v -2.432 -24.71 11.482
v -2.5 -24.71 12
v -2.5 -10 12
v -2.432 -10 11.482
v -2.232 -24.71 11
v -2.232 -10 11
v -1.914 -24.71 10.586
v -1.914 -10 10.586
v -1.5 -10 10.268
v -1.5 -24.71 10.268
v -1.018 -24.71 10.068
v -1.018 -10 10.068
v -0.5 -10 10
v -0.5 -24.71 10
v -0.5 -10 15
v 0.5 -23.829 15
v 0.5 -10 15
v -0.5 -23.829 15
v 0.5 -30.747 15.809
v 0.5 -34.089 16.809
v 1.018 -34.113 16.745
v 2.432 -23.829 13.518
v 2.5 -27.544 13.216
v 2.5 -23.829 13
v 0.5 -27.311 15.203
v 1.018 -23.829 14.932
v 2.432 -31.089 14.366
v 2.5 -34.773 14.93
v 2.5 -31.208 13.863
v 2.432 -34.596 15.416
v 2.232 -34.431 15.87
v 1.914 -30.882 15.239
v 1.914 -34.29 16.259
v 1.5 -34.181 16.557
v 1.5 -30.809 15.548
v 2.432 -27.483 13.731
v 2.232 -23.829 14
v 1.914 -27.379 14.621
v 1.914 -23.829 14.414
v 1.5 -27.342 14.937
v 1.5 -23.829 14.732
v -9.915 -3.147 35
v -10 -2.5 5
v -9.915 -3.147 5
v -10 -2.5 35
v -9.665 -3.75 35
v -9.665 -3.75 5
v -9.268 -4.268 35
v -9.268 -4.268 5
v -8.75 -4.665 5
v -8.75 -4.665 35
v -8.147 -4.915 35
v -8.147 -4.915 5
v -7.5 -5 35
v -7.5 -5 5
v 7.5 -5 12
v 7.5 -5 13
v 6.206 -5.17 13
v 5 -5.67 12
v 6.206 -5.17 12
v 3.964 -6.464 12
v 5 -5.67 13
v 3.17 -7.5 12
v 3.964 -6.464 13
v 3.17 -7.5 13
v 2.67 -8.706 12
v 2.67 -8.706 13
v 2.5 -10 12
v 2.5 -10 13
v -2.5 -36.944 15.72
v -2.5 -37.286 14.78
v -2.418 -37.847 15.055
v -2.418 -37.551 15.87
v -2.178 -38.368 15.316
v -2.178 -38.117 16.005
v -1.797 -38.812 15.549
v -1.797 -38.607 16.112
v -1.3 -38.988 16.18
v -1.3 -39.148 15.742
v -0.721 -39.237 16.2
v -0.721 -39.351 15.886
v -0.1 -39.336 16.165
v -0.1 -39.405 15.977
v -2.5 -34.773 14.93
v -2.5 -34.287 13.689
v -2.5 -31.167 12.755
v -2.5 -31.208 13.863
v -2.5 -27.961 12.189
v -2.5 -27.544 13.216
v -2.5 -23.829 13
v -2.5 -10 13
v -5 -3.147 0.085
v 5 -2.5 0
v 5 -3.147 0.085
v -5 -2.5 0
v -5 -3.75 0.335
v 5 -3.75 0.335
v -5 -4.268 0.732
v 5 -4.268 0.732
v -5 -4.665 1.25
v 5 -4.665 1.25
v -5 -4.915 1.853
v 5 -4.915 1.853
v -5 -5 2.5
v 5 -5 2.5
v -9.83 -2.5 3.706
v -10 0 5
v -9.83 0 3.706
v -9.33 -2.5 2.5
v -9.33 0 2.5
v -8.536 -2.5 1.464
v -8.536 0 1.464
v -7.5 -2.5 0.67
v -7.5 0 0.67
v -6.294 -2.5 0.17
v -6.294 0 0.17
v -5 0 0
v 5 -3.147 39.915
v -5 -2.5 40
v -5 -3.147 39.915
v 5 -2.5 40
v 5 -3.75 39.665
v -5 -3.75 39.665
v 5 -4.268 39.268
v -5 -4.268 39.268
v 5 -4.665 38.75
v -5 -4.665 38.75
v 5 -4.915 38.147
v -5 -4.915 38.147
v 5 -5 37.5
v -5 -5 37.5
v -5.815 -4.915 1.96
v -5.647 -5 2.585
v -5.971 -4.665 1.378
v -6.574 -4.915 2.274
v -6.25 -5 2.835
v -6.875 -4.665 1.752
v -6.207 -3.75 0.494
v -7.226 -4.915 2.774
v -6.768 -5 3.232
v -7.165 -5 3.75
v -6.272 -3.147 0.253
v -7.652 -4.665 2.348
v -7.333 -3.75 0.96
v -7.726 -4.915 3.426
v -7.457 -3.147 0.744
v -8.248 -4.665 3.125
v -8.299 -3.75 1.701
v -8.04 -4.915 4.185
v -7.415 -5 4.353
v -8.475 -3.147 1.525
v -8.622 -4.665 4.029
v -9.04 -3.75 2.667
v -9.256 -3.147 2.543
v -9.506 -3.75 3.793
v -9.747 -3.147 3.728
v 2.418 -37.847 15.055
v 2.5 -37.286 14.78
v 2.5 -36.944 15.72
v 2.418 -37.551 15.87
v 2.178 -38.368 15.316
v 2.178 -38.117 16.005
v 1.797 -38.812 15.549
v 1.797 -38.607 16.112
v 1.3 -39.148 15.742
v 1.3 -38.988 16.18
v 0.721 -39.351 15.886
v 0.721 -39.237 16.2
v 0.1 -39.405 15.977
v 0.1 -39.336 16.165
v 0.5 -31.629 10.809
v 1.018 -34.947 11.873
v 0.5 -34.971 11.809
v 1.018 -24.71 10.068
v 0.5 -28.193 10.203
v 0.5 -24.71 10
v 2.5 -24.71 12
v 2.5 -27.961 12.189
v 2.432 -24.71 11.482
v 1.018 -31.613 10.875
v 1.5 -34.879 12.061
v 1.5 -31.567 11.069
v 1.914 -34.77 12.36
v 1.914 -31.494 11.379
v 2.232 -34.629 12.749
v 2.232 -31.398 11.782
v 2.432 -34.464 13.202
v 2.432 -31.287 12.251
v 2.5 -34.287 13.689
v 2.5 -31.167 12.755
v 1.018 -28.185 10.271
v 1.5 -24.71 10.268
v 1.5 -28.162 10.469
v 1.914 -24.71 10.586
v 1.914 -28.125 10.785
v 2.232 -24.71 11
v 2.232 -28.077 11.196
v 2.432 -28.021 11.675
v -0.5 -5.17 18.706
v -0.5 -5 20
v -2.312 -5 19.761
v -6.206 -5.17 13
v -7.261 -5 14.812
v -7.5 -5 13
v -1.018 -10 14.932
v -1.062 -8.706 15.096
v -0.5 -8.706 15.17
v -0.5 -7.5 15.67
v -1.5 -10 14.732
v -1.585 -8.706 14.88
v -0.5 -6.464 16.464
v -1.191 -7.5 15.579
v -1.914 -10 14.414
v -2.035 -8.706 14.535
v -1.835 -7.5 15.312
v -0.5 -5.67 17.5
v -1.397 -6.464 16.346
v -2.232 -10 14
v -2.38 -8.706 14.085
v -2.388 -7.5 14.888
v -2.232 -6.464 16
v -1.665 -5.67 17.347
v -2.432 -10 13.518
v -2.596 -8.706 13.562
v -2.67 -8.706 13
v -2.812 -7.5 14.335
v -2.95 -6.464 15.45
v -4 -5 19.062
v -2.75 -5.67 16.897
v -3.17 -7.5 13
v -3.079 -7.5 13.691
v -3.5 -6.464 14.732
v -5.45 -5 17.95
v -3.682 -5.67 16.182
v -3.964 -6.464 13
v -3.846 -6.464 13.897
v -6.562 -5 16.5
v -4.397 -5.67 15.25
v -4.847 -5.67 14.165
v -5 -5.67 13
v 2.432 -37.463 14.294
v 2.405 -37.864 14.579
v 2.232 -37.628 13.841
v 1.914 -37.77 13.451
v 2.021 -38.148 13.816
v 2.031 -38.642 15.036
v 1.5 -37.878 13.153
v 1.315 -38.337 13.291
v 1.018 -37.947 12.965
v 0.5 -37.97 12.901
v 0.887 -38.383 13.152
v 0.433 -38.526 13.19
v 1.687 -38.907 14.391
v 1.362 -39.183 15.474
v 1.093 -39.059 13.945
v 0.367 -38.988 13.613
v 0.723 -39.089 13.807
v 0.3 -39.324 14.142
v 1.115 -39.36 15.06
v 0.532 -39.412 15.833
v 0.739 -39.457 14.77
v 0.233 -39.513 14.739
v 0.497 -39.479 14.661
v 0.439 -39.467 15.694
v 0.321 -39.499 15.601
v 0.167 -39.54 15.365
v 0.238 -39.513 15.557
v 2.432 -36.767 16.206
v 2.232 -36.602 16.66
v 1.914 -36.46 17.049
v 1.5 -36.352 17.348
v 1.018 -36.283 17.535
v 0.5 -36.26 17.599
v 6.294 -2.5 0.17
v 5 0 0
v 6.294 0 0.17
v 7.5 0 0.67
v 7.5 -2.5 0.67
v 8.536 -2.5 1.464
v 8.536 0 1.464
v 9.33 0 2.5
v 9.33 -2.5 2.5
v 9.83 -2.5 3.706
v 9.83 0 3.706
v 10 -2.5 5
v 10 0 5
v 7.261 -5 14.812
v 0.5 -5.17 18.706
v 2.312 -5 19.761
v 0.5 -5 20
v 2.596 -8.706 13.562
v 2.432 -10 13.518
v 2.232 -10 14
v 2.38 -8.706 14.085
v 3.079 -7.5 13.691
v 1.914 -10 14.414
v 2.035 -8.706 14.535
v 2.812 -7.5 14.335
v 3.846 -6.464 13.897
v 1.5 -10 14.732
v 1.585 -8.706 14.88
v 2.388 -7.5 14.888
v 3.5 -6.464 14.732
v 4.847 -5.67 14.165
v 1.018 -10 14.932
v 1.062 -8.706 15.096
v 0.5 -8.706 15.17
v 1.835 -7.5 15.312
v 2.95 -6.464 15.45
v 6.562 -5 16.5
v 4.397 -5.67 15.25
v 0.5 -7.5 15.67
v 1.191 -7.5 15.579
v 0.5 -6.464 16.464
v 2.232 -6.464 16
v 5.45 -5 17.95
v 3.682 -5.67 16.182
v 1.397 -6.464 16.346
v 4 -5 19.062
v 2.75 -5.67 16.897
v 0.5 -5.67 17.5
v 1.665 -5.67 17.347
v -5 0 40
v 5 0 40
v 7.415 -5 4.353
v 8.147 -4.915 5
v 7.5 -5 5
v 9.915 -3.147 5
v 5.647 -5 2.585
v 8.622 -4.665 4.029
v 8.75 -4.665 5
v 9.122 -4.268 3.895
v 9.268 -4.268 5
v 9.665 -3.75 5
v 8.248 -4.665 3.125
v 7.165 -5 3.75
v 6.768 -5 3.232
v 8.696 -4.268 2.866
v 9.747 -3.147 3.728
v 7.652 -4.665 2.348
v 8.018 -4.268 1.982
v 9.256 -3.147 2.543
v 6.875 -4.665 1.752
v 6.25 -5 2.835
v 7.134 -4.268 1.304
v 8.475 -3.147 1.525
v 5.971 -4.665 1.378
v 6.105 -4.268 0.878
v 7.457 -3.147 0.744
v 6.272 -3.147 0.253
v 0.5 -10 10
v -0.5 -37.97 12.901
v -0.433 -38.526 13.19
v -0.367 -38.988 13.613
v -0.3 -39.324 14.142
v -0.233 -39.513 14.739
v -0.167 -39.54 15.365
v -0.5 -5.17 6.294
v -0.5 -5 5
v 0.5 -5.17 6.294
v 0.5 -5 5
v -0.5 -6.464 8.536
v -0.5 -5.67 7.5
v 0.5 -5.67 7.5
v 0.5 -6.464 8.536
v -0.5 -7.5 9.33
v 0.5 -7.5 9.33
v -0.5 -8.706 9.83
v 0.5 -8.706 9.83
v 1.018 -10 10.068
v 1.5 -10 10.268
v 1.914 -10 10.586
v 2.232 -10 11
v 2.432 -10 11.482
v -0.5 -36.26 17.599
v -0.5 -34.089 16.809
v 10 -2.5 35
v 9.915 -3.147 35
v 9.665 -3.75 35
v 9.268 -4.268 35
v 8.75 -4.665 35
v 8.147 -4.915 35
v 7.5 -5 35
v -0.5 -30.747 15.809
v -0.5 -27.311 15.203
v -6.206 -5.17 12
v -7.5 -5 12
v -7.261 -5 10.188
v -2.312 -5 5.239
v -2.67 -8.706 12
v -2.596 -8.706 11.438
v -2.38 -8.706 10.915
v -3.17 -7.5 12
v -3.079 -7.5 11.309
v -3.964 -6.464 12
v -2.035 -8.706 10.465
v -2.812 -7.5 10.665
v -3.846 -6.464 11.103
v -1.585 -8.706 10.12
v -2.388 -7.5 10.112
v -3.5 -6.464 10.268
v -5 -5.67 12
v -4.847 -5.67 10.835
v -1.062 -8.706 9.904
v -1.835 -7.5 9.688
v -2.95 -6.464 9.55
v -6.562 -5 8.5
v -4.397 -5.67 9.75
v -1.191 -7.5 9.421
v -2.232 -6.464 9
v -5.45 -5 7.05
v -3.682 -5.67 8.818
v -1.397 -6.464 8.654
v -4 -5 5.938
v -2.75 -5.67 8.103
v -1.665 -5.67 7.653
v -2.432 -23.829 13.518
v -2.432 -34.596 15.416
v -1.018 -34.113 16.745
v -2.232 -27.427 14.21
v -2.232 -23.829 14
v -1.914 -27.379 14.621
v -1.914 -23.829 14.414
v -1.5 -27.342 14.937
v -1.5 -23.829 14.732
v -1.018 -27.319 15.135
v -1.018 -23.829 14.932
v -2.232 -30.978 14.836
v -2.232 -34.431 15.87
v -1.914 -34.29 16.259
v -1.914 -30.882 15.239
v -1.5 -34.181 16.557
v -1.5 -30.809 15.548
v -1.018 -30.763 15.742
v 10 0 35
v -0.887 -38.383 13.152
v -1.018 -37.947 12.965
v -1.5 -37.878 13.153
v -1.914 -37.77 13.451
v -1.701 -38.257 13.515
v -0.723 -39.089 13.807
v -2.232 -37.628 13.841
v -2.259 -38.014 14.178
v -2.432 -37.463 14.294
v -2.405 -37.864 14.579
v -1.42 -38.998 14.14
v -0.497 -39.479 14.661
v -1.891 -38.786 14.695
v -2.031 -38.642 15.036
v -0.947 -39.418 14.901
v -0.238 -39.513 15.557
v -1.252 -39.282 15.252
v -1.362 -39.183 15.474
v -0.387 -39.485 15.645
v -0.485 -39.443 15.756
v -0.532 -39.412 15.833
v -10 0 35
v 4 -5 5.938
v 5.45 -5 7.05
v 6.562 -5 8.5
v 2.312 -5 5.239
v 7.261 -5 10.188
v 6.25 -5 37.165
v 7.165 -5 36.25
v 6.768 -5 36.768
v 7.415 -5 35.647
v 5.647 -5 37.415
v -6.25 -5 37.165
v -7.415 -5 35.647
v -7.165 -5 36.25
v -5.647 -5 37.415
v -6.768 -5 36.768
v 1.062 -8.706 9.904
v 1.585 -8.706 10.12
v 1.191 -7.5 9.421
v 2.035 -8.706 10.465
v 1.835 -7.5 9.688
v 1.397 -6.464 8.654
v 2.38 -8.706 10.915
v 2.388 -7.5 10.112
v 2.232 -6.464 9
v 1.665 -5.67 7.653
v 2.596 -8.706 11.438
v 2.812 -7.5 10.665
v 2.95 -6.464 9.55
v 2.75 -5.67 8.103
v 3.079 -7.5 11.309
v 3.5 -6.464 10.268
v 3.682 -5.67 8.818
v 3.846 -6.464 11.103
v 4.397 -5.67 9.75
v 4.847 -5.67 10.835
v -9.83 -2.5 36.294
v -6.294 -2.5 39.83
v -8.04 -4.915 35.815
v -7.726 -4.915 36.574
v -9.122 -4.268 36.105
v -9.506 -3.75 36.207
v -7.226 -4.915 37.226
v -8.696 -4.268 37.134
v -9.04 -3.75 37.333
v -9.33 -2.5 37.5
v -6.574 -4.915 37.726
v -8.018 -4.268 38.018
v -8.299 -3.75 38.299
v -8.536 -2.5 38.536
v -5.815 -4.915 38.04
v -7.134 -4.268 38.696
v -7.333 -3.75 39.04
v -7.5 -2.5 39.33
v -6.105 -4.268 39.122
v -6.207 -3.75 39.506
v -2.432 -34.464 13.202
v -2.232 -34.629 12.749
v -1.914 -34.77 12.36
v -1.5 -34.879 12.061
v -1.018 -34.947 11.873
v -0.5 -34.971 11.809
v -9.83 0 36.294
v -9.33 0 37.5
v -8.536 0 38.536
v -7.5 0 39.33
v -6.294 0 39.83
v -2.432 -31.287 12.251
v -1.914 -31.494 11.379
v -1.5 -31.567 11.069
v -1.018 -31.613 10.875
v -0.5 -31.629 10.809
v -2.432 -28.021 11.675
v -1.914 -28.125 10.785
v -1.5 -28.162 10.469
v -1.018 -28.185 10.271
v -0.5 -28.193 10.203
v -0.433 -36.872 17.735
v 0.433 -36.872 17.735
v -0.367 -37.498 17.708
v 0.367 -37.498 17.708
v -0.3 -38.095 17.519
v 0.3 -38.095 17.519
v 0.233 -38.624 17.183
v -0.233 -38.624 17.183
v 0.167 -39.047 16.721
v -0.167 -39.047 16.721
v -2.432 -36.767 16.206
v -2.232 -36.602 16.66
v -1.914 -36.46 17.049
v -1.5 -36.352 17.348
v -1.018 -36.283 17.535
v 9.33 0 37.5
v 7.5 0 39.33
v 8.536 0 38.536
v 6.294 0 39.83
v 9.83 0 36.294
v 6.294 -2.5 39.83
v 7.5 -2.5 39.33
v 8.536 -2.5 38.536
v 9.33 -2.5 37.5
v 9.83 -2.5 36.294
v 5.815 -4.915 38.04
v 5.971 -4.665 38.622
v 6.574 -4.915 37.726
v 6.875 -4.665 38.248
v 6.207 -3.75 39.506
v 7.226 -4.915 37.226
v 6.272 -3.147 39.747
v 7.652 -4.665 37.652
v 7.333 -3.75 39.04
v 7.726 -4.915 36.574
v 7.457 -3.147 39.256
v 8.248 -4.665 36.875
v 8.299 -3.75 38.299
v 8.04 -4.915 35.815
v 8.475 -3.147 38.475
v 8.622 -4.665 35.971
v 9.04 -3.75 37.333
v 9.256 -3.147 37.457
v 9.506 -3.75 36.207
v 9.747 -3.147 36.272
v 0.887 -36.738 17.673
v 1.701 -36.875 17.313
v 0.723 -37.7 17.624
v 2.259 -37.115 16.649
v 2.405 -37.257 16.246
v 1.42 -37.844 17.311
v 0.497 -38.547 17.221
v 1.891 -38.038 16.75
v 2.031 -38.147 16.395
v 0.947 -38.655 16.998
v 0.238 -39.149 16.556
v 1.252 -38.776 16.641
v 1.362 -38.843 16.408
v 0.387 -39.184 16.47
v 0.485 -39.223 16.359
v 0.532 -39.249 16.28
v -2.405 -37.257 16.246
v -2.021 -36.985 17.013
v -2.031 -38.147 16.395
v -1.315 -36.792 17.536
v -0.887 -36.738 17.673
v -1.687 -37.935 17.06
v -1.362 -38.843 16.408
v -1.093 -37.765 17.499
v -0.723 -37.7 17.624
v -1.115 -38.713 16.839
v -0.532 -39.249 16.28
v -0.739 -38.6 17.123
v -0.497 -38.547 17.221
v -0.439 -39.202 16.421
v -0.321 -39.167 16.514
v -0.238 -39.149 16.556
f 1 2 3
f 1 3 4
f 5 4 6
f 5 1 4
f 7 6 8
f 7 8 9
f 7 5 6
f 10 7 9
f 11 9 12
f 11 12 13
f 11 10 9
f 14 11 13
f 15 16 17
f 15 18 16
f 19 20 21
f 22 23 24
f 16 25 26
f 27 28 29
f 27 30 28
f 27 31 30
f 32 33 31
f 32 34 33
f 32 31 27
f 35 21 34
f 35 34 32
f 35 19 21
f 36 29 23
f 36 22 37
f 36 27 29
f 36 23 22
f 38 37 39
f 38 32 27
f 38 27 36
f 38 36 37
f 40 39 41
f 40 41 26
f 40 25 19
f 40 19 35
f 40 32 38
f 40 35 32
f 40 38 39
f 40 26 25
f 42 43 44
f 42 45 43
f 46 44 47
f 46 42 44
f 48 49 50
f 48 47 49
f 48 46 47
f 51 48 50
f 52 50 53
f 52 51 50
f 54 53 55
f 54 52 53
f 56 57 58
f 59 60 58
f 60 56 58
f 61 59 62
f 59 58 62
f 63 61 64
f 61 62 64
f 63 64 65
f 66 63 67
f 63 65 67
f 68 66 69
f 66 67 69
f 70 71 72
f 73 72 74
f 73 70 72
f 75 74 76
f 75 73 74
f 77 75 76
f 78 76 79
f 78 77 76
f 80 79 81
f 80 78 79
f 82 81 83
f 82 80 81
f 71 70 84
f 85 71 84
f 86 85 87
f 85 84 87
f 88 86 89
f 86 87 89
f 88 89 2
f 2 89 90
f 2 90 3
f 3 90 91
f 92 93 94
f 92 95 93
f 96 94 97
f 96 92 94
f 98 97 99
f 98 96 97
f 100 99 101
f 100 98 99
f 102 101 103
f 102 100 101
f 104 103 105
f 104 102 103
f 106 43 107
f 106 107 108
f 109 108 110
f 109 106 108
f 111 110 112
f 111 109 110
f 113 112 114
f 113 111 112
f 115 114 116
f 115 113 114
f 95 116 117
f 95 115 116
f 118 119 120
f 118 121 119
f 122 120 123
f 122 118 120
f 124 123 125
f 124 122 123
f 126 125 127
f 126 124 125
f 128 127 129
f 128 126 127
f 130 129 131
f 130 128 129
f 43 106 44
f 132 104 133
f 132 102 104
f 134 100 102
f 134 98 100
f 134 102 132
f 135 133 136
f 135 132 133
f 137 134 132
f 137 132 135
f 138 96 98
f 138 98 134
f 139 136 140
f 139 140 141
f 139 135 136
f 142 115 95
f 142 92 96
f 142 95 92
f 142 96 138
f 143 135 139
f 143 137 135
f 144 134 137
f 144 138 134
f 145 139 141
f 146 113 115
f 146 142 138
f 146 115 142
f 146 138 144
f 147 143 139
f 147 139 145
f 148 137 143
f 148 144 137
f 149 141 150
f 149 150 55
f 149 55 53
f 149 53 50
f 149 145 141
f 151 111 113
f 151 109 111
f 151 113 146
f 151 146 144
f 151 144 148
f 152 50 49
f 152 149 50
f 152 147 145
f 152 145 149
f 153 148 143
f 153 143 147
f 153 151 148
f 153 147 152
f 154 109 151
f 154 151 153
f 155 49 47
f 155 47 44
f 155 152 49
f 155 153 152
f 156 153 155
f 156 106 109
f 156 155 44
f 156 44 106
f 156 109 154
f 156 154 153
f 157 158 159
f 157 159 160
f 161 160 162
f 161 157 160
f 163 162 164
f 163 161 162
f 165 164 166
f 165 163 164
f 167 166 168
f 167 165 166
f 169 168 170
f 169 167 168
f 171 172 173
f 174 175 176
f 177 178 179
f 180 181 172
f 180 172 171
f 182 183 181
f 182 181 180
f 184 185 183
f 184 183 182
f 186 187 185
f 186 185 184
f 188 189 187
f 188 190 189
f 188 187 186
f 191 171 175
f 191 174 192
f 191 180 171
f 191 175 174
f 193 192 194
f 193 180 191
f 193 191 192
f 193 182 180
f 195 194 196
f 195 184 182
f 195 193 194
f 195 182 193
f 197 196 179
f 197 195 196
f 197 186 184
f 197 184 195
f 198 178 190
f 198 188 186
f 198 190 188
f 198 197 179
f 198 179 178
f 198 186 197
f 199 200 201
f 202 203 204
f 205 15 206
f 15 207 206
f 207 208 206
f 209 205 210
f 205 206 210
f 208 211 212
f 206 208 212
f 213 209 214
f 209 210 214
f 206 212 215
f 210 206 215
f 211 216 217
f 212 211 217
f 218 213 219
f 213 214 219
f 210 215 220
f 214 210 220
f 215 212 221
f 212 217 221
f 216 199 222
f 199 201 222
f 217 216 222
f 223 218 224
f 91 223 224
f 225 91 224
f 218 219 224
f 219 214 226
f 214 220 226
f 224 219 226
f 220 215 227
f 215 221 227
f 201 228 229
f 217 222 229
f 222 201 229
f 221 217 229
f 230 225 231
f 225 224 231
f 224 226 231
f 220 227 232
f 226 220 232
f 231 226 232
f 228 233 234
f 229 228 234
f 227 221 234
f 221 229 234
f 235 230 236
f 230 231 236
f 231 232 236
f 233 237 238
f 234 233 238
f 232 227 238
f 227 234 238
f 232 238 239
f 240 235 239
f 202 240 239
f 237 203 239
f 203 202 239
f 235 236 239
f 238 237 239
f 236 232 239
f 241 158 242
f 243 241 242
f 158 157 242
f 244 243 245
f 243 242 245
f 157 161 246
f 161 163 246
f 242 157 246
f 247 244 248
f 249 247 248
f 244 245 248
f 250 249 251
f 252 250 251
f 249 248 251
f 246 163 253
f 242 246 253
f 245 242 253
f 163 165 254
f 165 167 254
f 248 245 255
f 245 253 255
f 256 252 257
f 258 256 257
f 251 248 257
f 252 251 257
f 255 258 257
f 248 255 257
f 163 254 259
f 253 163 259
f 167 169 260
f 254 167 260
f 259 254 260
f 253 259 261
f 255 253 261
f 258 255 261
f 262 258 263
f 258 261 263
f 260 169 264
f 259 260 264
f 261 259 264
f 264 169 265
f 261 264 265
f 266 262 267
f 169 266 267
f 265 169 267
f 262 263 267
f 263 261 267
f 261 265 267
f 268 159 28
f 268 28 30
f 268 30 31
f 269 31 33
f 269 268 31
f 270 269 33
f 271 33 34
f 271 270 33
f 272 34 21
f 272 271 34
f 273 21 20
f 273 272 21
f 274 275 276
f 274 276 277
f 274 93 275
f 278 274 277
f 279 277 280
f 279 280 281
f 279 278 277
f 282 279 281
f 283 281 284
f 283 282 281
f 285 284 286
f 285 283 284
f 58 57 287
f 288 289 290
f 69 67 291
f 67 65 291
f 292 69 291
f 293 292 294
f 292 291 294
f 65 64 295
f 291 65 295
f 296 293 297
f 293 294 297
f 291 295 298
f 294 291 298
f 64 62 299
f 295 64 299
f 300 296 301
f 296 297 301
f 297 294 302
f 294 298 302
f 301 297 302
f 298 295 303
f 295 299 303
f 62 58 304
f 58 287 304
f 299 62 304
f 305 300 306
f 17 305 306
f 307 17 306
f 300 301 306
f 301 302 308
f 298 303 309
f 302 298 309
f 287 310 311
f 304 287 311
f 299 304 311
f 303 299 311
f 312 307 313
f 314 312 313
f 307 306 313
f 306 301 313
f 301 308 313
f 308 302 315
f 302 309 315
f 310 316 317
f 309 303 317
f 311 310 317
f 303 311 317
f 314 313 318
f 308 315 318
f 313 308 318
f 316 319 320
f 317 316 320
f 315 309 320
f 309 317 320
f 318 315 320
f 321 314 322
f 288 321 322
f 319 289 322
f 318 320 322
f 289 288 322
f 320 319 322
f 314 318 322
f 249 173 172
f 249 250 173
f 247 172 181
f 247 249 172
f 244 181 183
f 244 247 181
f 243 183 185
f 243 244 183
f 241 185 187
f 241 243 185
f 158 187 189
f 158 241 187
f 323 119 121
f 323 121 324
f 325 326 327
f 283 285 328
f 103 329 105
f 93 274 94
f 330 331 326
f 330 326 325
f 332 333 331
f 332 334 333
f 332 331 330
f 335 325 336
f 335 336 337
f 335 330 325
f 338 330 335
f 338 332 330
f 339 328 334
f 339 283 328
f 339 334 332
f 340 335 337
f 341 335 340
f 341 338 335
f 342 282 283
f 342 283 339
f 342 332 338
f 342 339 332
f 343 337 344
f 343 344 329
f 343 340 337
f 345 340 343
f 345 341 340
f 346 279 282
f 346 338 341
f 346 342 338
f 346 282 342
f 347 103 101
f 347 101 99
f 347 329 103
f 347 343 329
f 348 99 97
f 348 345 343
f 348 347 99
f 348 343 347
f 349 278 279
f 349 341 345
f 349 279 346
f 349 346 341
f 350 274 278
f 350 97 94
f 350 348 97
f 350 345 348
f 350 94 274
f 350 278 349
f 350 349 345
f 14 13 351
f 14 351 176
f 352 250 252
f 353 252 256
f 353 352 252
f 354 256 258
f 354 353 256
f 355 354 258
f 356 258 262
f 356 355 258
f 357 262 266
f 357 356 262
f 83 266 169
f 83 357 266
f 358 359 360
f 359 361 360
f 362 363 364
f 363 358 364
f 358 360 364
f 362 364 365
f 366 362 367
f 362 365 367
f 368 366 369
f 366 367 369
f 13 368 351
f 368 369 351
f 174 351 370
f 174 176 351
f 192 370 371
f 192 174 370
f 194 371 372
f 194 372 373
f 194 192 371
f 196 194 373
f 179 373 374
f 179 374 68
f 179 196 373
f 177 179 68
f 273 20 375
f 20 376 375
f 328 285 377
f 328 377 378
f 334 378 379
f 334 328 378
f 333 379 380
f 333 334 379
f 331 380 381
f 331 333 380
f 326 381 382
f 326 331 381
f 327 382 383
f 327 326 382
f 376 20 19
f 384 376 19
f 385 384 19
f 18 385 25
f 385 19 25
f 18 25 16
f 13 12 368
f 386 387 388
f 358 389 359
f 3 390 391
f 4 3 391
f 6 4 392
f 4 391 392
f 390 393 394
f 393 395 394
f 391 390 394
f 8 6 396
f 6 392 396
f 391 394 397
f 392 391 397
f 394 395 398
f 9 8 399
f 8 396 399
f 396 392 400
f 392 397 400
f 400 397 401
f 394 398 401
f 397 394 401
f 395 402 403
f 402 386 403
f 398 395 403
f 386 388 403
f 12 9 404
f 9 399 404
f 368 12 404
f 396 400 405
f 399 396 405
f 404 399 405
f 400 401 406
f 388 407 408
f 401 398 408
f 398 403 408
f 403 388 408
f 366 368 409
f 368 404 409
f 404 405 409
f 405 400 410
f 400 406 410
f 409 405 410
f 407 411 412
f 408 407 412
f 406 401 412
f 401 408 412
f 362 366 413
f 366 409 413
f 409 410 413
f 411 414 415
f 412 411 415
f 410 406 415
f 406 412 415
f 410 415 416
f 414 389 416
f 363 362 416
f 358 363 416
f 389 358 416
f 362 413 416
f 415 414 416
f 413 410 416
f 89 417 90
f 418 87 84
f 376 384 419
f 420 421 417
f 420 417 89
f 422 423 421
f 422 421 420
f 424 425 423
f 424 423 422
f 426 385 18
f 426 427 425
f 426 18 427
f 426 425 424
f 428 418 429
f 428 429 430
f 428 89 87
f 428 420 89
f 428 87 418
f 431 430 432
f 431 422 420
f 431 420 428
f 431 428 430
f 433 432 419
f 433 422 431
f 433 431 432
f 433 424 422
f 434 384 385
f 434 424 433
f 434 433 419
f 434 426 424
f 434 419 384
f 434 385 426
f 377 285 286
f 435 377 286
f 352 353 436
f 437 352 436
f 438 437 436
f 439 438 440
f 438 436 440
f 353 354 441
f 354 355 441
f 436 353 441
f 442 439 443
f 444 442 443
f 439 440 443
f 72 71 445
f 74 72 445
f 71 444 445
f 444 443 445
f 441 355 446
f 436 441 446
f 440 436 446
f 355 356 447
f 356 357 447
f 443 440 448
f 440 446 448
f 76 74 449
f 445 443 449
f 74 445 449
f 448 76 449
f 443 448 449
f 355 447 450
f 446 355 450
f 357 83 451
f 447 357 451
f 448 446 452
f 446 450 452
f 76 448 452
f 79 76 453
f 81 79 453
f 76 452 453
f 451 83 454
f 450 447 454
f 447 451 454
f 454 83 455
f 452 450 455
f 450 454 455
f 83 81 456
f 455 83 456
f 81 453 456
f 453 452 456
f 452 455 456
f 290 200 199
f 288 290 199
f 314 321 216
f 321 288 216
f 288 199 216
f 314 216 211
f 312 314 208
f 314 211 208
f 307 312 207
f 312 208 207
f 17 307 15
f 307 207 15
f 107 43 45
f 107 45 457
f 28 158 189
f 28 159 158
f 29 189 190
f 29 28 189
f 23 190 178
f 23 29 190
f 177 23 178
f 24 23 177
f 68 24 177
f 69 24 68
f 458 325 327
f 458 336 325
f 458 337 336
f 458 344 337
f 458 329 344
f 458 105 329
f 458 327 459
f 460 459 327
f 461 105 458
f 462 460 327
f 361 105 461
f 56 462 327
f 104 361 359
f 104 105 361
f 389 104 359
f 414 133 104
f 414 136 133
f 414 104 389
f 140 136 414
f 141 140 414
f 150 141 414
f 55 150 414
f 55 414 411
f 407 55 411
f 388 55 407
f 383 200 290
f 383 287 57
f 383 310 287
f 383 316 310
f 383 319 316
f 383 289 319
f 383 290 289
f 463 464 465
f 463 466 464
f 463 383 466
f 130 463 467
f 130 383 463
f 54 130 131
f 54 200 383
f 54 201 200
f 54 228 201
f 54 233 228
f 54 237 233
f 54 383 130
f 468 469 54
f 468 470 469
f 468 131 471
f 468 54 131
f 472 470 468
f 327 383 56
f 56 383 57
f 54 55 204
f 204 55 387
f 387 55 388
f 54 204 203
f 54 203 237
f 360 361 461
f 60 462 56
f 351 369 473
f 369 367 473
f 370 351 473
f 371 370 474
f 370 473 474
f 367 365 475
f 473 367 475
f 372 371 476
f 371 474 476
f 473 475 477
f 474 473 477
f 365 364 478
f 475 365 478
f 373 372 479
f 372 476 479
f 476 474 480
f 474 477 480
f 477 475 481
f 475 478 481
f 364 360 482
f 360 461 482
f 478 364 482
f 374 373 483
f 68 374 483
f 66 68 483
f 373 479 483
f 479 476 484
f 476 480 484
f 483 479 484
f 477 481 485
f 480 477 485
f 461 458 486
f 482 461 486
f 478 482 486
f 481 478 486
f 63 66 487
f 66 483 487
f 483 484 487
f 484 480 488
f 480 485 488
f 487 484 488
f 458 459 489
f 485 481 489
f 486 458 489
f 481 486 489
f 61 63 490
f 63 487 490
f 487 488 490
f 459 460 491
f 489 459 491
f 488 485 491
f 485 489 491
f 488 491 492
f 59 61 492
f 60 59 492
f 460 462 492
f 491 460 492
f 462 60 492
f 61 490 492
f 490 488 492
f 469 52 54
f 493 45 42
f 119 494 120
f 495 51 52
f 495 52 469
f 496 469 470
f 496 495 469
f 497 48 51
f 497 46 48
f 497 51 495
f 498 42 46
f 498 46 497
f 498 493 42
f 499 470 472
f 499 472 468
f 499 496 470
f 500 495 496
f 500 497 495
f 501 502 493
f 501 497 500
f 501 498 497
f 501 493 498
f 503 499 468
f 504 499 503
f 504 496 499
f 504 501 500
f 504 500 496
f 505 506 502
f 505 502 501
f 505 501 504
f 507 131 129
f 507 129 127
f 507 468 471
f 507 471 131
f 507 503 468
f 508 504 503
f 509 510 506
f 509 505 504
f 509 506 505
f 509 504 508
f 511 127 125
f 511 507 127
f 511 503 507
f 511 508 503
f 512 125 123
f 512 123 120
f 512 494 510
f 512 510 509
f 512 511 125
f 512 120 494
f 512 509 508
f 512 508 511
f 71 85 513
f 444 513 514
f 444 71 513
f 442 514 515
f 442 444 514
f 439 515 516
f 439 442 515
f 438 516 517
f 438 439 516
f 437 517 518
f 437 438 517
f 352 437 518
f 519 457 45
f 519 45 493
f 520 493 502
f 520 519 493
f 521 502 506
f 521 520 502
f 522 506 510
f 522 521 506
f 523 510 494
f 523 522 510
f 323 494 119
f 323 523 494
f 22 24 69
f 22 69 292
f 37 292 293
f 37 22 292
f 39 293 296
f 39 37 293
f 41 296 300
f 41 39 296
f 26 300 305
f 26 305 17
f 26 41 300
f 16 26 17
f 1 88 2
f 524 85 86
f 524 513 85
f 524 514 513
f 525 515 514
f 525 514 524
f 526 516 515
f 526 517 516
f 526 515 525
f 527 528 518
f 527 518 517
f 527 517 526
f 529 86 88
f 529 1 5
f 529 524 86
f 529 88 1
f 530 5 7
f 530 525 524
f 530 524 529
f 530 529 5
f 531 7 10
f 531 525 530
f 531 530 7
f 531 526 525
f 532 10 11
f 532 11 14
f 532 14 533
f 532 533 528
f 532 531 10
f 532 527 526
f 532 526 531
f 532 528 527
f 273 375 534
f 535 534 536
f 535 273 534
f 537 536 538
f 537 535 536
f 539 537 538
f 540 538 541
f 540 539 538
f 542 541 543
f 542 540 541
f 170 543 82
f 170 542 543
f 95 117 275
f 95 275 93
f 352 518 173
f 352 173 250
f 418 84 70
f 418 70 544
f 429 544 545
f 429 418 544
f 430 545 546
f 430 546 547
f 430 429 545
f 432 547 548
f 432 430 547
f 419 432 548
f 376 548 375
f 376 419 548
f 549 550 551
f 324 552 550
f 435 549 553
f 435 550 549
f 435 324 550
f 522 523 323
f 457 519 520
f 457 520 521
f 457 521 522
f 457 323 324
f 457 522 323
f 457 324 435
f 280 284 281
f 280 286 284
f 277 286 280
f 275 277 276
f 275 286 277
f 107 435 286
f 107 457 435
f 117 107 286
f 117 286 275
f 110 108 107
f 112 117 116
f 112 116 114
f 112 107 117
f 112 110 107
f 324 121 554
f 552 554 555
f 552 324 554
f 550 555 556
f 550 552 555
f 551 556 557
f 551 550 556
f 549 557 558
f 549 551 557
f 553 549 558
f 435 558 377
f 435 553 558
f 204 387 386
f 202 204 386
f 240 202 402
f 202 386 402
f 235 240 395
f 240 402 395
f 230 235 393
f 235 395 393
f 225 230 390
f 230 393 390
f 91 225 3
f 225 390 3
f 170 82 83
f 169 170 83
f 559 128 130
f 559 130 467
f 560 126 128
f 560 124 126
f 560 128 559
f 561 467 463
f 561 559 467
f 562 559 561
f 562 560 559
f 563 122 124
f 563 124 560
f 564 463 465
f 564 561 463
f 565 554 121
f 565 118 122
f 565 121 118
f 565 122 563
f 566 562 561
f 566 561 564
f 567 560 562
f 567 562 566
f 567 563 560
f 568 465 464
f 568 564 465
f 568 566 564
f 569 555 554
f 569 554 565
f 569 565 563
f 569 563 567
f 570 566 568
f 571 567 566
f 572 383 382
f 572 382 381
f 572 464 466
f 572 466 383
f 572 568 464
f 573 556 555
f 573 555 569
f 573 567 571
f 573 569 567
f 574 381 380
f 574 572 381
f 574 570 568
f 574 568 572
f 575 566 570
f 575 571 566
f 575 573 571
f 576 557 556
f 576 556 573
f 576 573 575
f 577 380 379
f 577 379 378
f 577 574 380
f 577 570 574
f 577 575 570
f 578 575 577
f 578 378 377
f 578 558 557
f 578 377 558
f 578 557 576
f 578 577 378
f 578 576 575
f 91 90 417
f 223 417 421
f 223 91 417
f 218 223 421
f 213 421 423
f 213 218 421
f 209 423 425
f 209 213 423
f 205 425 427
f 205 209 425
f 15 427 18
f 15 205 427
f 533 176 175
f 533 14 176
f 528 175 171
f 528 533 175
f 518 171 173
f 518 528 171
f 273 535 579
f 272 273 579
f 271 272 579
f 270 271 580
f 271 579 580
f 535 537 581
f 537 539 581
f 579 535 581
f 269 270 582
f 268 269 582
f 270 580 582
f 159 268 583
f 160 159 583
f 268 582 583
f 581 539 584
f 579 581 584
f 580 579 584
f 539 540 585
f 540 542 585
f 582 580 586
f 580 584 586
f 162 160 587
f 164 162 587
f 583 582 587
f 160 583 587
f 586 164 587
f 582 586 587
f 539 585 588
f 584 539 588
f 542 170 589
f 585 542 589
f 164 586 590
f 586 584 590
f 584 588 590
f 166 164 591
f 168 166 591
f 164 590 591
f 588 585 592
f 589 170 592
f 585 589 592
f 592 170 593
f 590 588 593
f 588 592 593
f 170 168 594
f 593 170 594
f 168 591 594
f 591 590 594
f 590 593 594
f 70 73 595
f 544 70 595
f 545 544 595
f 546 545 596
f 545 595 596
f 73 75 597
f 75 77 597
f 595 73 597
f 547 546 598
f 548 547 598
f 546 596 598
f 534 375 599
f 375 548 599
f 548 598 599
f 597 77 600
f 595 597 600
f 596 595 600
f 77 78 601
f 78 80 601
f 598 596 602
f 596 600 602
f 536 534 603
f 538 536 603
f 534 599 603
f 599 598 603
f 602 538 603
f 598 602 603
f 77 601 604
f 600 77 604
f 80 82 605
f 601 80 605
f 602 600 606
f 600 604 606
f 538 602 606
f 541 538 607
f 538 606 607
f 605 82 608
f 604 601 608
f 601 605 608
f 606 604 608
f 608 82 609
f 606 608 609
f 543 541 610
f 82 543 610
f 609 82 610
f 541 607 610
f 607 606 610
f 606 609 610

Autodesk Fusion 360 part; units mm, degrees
sketch "Sketch1" plane through (0, 0, 0) normal (1, 0, 0) x (0, 1, 0) in component "Main"
  line L0 (0, 0) -> (-5, 0)
  line L1 (-5, 0) -> (-5, 10)
  line L2 (-5, 10) -> (-30, 10)
  line L3 (-29.1184, 15) -> (-5, 15)
  line L4 (-5, 15) -> (-5, 40)
  line L5 (-5, 40) -> (0, 40)
  line L6 (0, 40) -> (0, 0)
  line L7 (-29.1184, 15) -> (-38.5153, 18.4202)
  line L8 (-30, 10) -> (-40.2254, 13.7217)
  line L9 (-38.5153, 18.4202) -> (-40.2254, 13.7217)
  line L10 (-5, 15) -> (-5, 10)
  dimension "d1" = 5
  dimension "d3" = 40
  dimension "d4" = 10
  dimension "d5" = 5
  dimension "d6" = 5
  dimension "d7" = 160
  dimension "d8" = 25
  dimension "d9" = 10
extrude "Extrude1" add sketch "Sketch1" along normal mid plane 5 contours L2 L3 L7 L8 L9 L10 in component "Main"
extrude "Extrude2" add sketch "Sketch1" along normal mid plane 20 contours L0 L1 L4 L5 L6 L10 in component "Main"
fillet "Fillet4" radius 30 2 edges at (0, -29.1184, 15) (0, -30, 10) in component "Main"
fillet "Fillet5" radius 2 12 edges at (-2.5, -14.4143, 15) (-2.5, -29.038, 15.4558) (-2.5, -36.3022, 17.6147) (2.5, -36.3022, 17.6147) (2.5, -29.038, 15.4558) (2.5, -14.4143, 15) (2.5, -14.8551, 10) (2.5, -29.9196, 10.4558) (2.5, -37.5981, 12.7655) (-2.5, -37.5981, 12.7655) (-2.5, -29.9196, 10.4558) (-2.5, -14.8551, 10) in component "Main"
fillet "Fillet6" radius 5 8 edges at (-1.9142, -5, 10.5858) (0, -5, 10) (1.9142, -5, 10.5858) (2.5, -5, 12.5) (1.9142, -5, 14.4142) (0, -5, 15) (-1.9142, -5, 14.4142) (-2.5, -5, 12.5) in component "Main"
fillet "Fillet7" radius 5 4 edges at (-10, -2.5, 40) (10, -2.5, 40) (10, -2.5, 0) (-10, -2.5, 0) in component "Main"
fillet "Fillet8" radius 2.5 8 edges at (-8.5355, -5, 38.5355) (-10, -5, 20) (-8.5355, -5, 1.4645) (0, -5, 0) (8.5355, -5, 1.4645) (10, -5, 20) (8.5355, -5, 38.5355) (0, -5, 40) in component "Main"
fillet "Fillet9" radius 2.4 8 edges at (2.5, -39.3703, 16.071) (1.9142, -40.025, 14.2722) (0, -40.2254, 13.7217) (-1.9142, -40.025, 14.2722) (-2.5, -39.3703, 16.071) (-1.9142, -38.7156, 17.8697) (0, -38.5153, 18.4202) (1.9142, -38.7156, 17.8697) in component "Main"
component "Main" placed x (1, 0, 0) y (0, 1, 0) z (0, 0, 1) at (0, 0, 0)
